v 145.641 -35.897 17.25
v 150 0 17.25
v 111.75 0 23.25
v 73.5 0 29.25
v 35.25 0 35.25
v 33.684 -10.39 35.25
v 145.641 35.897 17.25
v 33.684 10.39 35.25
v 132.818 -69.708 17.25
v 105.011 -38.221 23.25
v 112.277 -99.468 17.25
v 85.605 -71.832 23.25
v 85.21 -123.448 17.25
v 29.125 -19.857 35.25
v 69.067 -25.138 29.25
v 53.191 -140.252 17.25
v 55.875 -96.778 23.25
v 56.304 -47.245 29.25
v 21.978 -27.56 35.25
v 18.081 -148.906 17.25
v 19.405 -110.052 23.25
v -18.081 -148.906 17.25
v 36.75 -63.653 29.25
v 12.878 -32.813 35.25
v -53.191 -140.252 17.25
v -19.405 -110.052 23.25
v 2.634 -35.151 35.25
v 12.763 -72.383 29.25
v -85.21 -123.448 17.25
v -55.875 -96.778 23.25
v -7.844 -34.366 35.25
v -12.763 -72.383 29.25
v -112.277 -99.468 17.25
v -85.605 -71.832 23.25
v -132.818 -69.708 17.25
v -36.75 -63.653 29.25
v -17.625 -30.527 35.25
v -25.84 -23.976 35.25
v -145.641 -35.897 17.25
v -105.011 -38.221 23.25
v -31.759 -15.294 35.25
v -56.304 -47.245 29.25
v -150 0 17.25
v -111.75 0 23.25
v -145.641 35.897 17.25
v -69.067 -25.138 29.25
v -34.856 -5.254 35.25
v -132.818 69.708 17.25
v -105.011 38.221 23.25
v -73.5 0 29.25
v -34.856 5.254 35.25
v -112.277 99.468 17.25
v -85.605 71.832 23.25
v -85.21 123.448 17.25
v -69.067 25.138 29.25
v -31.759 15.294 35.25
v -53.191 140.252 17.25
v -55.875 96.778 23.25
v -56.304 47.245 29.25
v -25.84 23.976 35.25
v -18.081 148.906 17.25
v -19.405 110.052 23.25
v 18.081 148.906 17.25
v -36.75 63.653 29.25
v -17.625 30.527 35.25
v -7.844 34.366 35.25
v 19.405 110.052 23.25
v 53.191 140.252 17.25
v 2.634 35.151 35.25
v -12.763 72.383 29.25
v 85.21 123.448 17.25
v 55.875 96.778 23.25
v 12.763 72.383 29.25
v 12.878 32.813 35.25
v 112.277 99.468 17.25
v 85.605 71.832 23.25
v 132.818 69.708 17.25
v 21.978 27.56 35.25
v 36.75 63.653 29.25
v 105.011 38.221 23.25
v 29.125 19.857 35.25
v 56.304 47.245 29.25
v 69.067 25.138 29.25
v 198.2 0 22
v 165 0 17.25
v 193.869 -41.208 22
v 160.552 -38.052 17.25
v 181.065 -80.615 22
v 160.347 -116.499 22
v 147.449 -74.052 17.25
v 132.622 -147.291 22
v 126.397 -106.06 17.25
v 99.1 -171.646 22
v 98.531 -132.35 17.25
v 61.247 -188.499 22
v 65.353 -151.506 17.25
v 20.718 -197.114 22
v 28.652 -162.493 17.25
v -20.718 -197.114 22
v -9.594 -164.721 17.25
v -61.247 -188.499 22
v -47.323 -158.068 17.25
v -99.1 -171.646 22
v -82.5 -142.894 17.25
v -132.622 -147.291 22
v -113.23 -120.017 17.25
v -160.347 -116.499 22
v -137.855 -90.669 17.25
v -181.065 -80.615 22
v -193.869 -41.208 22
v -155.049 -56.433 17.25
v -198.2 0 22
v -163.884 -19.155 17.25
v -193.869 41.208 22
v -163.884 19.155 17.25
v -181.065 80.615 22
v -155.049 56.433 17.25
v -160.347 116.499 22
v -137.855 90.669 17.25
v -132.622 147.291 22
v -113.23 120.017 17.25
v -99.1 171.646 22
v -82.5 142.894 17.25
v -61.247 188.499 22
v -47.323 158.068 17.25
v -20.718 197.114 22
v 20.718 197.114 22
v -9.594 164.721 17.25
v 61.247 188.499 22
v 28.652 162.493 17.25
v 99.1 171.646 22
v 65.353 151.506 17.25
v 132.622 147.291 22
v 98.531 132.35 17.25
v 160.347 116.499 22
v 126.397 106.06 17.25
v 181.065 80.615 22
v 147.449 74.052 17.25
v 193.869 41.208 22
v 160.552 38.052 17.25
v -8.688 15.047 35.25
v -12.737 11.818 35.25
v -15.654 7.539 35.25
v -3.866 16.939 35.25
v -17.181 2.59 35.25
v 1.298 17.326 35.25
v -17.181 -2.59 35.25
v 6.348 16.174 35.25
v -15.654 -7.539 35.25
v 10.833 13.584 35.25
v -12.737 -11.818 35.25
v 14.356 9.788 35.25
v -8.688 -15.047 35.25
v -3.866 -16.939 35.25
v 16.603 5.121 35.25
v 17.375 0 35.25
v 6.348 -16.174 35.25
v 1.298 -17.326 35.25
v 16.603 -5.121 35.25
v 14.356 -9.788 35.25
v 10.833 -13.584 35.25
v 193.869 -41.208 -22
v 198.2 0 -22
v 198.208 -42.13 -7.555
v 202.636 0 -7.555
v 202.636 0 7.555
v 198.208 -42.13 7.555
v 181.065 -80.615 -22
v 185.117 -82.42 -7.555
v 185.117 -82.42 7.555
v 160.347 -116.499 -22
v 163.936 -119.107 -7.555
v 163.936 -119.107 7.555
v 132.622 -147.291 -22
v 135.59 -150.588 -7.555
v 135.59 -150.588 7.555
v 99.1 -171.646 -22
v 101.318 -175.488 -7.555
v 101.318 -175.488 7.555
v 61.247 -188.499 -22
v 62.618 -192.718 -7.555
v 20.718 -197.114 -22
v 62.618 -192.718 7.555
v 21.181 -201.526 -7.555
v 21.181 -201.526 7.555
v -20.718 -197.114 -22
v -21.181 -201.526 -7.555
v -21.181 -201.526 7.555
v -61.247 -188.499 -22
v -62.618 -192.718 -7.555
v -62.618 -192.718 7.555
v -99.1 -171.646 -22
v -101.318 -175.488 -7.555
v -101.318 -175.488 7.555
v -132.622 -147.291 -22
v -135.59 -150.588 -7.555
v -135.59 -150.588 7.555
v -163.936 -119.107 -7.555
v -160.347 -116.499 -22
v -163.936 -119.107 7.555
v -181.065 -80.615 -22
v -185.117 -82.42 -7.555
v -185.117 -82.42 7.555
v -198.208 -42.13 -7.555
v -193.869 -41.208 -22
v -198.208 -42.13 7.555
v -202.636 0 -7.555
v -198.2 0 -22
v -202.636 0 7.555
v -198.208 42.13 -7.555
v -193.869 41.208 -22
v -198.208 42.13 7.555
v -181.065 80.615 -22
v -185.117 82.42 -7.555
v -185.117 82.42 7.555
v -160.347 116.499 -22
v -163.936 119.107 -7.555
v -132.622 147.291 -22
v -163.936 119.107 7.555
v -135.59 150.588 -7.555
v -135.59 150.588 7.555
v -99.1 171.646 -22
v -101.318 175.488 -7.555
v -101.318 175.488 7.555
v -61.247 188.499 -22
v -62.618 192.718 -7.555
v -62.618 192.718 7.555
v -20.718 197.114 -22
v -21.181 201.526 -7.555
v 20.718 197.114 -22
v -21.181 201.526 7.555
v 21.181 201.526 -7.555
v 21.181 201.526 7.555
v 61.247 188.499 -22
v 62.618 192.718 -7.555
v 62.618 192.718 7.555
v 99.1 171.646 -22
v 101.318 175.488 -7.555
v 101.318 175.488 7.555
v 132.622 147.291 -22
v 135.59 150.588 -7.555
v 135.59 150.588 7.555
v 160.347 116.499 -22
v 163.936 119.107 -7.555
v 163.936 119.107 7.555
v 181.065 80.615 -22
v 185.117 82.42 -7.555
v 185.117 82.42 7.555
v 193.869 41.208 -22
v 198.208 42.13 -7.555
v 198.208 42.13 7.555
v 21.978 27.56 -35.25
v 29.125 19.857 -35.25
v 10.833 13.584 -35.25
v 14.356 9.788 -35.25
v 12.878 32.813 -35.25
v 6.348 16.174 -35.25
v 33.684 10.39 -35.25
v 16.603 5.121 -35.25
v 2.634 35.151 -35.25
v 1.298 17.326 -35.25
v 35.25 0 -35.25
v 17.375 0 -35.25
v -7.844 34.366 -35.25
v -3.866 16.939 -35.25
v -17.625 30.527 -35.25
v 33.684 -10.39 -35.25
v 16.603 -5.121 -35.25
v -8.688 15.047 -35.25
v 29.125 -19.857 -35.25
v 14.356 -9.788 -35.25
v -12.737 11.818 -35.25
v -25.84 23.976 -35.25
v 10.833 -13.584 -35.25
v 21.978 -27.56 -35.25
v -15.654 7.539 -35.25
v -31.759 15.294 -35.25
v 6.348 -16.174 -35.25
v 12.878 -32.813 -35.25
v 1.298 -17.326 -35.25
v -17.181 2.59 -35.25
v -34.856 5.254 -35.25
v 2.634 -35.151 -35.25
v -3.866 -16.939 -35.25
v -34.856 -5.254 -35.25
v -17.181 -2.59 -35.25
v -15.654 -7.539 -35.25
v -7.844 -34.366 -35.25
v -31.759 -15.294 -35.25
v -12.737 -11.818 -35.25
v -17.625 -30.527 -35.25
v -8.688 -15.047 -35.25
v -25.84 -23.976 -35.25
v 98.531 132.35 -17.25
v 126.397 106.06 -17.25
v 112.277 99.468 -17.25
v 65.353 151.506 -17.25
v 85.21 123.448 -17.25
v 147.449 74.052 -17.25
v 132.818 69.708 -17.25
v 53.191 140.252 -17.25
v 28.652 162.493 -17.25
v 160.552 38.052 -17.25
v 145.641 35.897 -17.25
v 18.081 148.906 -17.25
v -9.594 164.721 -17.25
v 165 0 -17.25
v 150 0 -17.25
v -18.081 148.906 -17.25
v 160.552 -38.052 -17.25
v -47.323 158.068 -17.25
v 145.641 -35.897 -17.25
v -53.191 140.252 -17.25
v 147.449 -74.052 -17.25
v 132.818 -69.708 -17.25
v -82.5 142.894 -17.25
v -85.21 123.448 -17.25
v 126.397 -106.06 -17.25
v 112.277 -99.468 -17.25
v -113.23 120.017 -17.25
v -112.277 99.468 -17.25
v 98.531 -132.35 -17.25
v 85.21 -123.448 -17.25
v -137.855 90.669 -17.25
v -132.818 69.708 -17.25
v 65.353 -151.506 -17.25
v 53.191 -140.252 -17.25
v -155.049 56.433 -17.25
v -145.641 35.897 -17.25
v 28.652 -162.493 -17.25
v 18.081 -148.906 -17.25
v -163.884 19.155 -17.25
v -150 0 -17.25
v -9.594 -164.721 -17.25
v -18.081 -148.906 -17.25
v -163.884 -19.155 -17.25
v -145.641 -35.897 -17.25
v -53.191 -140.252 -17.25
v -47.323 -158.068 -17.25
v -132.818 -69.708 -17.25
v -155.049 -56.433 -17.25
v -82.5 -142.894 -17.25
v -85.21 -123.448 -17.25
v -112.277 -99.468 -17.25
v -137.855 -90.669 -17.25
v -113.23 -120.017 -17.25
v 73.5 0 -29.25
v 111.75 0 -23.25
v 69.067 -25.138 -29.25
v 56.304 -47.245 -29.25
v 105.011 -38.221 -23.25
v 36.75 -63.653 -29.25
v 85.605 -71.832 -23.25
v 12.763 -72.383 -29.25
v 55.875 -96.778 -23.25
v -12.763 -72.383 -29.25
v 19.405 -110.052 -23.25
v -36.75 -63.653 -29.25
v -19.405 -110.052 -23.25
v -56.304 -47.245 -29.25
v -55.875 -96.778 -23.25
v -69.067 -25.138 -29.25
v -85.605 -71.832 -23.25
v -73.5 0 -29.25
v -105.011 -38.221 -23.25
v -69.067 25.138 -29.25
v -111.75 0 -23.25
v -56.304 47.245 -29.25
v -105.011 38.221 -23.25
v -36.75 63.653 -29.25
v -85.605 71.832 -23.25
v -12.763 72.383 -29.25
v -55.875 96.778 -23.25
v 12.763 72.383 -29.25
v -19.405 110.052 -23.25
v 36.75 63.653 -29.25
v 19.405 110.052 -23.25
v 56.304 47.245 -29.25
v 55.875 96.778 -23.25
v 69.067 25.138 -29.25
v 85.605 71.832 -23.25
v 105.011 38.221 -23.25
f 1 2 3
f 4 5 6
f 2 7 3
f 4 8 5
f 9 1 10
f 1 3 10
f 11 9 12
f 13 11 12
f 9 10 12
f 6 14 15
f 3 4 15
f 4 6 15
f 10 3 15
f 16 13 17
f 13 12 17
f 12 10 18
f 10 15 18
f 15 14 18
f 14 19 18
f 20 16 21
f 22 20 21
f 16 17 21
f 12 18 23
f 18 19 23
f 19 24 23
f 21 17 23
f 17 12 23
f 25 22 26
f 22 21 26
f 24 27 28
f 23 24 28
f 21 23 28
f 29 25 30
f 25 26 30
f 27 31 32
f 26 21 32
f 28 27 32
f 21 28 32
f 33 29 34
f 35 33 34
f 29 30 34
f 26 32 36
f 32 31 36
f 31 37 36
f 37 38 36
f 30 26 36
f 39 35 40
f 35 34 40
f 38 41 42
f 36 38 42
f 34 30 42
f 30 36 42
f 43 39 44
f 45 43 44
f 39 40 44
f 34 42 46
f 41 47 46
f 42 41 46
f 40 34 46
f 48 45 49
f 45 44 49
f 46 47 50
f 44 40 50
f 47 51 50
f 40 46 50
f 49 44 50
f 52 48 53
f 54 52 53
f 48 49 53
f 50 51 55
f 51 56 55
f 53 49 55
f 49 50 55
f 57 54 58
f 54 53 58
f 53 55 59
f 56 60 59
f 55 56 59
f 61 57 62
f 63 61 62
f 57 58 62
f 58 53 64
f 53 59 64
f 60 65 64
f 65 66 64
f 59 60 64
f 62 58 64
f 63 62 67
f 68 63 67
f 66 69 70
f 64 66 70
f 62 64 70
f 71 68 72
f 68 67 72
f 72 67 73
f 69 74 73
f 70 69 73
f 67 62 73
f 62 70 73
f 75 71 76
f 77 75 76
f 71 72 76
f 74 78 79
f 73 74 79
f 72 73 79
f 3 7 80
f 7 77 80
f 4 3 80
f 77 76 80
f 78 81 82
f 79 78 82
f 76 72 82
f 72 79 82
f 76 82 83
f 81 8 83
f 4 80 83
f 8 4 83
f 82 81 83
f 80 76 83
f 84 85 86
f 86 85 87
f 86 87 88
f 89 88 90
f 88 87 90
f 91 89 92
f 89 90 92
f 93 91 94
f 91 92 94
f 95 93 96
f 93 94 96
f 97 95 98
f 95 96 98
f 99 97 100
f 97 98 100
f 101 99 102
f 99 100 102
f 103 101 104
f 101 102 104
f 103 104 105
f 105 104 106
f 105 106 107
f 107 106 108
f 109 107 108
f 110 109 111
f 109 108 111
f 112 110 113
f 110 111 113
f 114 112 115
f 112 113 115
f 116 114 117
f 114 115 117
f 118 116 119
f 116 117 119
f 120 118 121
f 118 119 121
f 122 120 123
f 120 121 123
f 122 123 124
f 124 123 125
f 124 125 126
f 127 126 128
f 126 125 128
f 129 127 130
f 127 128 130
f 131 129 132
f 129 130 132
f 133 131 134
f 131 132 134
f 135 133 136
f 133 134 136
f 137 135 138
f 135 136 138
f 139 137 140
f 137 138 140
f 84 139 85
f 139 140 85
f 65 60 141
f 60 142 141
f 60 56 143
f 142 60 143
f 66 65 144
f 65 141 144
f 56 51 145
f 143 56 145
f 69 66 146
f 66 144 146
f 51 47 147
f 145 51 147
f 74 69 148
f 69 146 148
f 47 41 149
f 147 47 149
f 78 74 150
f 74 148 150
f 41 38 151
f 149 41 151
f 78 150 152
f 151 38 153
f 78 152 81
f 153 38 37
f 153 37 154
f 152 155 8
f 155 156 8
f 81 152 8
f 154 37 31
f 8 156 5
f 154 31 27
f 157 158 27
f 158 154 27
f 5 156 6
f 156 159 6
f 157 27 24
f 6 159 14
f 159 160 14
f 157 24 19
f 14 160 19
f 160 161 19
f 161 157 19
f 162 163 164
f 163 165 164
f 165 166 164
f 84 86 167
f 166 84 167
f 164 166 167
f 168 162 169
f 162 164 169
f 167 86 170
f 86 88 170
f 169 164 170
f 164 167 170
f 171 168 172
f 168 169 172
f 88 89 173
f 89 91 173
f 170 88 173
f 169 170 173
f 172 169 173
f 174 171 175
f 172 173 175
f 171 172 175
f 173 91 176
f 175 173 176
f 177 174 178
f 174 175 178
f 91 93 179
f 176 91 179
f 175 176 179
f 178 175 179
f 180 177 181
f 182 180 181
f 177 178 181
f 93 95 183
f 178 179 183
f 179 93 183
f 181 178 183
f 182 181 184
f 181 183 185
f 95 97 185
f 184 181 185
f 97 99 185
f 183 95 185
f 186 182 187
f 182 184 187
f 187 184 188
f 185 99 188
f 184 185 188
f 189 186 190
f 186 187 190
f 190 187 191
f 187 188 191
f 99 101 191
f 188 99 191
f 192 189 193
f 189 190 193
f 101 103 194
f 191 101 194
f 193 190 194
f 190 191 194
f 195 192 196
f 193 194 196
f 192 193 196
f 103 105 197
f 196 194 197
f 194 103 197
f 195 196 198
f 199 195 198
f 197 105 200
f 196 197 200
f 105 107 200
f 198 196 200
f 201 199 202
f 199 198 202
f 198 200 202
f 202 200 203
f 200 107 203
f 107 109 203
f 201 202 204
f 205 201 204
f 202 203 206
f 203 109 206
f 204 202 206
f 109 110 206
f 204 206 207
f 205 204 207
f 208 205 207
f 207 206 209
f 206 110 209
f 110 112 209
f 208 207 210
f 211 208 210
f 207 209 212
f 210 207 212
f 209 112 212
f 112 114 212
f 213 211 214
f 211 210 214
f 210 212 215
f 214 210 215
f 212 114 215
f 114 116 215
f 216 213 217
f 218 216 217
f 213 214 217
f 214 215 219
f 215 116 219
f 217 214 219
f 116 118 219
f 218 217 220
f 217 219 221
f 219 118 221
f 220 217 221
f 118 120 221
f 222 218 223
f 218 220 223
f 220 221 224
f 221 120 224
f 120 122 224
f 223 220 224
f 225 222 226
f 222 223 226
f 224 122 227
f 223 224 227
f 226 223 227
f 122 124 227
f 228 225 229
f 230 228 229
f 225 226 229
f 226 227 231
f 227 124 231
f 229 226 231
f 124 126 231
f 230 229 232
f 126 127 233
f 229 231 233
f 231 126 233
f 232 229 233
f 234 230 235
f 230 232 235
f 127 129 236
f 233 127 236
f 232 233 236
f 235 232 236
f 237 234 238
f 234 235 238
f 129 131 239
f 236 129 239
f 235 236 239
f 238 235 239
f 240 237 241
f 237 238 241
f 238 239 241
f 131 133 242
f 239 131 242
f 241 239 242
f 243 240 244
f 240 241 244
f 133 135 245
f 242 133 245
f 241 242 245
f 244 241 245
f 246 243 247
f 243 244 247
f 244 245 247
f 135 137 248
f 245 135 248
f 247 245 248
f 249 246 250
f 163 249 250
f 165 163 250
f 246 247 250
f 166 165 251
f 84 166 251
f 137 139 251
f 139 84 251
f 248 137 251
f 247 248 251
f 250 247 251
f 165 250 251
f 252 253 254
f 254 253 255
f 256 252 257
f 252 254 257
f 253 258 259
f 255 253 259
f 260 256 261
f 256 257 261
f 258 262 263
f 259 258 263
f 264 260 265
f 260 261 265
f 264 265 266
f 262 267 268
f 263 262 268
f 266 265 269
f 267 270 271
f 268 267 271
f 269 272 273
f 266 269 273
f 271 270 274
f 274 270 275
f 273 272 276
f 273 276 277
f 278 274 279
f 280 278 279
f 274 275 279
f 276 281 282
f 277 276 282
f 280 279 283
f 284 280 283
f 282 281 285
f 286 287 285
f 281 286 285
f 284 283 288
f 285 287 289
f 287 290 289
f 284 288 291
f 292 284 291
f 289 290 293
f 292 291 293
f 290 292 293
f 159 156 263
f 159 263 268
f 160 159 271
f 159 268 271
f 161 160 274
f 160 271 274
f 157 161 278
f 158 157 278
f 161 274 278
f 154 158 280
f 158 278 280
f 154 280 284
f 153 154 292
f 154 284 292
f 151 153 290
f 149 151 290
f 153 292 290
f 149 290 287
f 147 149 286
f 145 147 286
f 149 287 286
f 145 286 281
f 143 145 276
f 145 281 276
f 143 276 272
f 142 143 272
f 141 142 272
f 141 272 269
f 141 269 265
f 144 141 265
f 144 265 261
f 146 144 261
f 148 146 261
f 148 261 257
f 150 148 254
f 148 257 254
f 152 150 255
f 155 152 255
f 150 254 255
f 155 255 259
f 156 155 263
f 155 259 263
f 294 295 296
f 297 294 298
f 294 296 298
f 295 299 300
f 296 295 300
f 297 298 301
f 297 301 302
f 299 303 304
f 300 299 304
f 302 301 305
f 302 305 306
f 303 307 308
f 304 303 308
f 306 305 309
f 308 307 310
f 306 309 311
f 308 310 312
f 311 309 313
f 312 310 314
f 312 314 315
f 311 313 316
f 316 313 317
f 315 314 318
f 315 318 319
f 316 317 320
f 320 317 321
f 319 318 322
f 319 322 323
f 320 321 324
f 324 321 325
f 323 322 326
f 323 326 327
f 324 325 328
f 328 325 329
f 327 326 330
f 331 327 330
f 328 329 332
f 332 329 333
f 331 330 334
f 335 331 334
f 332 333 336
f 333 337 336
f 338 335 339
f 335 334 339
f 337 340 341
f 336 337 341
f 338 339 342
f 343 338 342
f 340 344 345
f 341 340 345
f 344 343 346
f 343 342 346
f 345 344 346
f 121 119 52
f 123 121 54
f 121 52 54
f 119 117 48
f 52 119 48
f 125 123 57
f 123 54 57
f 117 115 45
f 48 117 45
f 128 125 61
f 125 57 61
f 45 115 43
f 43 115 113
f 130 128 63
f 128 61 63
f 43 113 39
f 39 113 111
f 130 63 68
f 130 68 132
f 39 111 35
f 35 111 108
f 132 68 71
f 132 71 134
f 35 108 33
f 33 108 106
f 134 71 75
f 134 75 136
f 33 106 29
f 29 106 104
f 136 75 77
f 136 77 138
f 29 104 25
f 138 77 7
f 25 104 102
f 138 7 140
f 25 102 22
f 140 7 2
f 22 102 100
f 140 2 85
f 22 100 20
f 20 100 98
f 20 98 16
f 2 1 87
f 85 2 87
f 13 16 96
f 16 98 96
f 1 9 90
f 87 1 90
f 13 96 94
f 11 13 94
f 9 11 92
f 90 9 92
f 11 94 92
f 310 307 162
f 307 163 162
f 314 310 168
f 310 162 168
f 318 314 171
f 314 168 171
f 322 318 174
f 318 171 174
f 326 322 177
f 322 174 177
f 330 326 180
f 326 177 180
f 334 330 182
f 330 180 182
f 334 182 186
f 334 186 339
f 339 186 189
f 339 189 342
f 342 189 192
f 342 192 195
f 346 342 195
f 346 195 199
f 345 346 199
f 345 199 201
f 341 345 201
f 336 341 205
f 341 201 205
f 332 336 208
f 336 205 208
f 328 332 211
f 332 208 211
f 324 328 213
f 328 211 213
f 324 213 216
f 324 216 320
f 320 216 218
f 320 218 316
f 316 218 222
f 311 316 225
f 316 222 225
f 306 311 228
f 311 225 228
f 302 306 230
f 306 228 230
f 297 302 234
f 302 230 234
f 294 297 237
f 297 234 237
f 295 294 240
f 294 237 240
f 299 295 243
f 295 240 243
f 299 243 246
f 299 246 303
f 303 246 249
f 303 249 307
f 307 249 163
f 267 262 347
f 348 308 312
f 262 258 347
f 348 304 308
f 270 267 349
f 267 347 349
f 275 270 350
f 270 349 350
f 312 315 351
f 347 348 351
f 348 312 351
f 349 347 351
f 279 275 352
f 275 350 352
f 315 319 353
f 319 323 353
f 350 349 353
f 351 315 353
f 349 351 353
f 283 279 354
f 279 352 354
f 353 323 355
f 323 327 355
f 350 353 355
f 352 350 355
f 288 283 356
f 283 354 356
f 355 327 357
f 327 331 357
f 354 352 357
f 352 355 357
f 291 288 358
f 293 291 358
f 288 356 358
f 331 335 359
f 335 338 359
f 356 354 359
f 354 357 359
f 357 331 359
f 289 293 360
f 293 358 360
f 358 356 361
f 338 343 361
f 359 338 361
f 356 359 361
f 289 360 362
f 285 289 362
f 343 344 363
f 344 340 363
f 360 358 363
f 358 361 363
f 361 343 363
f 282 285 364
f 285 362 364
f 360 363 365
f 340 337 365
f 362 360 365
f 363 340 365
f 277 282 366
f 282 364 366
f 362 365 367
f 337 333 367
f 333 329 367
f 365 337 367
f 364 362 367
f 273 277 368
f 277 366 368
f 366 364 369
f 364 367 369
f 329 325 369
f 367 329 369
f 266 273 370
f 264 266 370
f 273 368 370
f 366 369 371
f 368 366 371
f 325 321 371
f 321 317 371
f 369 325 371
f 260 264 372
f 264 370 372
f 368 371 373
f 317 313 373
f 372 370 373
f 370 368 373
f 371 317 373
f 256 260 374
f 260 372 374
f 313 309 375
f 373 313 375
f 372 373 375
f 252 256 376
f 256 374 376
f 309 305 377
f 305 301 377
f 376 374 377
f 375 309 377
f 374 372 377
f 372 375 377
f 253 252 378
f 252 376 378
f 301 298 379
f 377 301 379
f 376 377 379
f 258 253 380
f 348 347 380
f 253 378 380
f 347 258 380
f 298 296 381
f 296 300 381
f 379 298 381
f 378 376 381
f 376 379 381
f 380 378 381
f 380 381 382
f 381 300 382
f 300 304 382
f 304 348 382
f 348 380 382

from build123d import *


with BuildPart() as part:
    # Sketch1 → Revolve1 (revolve)
    with BuildSketch(Plane(origin=(0, 0, 0), x_dir=(0, 0, -1), z_dir=(1, 0, 0)), mode=Mode.PRIVATE) as revolve1_sk:
        with BuildLine():
            Line((35.25, 35.25), (17.25, 150))
            Line((17.25, 150), (17.25, 165))
            Line((17.25, 165), (22, 198.2))
            ThreePointArc((22, 198.2), (0, 203.2), (-22, 198.2))
            Line((-22, 198.2), (-17.25, 165))
            Line((-17.25, 165), (-17.25, 150))
            Line((-17.25, 150), (-35.25, 35.25))
            Line((-35.25, 35.25), (-35.25, 17.375))
            Line((-35.25, 17.375), (35.25, 17.375))
            Line((35.25, 17.375), (35.25, 35.25))
        make_face()
    revolve(revolve1_sk.sketch.rotate(Axis((0, 0, 0), (0, 0, -1)), 90), axis=Axis((0, 0, 0), (0, 0, -1)))


solid = part.part
